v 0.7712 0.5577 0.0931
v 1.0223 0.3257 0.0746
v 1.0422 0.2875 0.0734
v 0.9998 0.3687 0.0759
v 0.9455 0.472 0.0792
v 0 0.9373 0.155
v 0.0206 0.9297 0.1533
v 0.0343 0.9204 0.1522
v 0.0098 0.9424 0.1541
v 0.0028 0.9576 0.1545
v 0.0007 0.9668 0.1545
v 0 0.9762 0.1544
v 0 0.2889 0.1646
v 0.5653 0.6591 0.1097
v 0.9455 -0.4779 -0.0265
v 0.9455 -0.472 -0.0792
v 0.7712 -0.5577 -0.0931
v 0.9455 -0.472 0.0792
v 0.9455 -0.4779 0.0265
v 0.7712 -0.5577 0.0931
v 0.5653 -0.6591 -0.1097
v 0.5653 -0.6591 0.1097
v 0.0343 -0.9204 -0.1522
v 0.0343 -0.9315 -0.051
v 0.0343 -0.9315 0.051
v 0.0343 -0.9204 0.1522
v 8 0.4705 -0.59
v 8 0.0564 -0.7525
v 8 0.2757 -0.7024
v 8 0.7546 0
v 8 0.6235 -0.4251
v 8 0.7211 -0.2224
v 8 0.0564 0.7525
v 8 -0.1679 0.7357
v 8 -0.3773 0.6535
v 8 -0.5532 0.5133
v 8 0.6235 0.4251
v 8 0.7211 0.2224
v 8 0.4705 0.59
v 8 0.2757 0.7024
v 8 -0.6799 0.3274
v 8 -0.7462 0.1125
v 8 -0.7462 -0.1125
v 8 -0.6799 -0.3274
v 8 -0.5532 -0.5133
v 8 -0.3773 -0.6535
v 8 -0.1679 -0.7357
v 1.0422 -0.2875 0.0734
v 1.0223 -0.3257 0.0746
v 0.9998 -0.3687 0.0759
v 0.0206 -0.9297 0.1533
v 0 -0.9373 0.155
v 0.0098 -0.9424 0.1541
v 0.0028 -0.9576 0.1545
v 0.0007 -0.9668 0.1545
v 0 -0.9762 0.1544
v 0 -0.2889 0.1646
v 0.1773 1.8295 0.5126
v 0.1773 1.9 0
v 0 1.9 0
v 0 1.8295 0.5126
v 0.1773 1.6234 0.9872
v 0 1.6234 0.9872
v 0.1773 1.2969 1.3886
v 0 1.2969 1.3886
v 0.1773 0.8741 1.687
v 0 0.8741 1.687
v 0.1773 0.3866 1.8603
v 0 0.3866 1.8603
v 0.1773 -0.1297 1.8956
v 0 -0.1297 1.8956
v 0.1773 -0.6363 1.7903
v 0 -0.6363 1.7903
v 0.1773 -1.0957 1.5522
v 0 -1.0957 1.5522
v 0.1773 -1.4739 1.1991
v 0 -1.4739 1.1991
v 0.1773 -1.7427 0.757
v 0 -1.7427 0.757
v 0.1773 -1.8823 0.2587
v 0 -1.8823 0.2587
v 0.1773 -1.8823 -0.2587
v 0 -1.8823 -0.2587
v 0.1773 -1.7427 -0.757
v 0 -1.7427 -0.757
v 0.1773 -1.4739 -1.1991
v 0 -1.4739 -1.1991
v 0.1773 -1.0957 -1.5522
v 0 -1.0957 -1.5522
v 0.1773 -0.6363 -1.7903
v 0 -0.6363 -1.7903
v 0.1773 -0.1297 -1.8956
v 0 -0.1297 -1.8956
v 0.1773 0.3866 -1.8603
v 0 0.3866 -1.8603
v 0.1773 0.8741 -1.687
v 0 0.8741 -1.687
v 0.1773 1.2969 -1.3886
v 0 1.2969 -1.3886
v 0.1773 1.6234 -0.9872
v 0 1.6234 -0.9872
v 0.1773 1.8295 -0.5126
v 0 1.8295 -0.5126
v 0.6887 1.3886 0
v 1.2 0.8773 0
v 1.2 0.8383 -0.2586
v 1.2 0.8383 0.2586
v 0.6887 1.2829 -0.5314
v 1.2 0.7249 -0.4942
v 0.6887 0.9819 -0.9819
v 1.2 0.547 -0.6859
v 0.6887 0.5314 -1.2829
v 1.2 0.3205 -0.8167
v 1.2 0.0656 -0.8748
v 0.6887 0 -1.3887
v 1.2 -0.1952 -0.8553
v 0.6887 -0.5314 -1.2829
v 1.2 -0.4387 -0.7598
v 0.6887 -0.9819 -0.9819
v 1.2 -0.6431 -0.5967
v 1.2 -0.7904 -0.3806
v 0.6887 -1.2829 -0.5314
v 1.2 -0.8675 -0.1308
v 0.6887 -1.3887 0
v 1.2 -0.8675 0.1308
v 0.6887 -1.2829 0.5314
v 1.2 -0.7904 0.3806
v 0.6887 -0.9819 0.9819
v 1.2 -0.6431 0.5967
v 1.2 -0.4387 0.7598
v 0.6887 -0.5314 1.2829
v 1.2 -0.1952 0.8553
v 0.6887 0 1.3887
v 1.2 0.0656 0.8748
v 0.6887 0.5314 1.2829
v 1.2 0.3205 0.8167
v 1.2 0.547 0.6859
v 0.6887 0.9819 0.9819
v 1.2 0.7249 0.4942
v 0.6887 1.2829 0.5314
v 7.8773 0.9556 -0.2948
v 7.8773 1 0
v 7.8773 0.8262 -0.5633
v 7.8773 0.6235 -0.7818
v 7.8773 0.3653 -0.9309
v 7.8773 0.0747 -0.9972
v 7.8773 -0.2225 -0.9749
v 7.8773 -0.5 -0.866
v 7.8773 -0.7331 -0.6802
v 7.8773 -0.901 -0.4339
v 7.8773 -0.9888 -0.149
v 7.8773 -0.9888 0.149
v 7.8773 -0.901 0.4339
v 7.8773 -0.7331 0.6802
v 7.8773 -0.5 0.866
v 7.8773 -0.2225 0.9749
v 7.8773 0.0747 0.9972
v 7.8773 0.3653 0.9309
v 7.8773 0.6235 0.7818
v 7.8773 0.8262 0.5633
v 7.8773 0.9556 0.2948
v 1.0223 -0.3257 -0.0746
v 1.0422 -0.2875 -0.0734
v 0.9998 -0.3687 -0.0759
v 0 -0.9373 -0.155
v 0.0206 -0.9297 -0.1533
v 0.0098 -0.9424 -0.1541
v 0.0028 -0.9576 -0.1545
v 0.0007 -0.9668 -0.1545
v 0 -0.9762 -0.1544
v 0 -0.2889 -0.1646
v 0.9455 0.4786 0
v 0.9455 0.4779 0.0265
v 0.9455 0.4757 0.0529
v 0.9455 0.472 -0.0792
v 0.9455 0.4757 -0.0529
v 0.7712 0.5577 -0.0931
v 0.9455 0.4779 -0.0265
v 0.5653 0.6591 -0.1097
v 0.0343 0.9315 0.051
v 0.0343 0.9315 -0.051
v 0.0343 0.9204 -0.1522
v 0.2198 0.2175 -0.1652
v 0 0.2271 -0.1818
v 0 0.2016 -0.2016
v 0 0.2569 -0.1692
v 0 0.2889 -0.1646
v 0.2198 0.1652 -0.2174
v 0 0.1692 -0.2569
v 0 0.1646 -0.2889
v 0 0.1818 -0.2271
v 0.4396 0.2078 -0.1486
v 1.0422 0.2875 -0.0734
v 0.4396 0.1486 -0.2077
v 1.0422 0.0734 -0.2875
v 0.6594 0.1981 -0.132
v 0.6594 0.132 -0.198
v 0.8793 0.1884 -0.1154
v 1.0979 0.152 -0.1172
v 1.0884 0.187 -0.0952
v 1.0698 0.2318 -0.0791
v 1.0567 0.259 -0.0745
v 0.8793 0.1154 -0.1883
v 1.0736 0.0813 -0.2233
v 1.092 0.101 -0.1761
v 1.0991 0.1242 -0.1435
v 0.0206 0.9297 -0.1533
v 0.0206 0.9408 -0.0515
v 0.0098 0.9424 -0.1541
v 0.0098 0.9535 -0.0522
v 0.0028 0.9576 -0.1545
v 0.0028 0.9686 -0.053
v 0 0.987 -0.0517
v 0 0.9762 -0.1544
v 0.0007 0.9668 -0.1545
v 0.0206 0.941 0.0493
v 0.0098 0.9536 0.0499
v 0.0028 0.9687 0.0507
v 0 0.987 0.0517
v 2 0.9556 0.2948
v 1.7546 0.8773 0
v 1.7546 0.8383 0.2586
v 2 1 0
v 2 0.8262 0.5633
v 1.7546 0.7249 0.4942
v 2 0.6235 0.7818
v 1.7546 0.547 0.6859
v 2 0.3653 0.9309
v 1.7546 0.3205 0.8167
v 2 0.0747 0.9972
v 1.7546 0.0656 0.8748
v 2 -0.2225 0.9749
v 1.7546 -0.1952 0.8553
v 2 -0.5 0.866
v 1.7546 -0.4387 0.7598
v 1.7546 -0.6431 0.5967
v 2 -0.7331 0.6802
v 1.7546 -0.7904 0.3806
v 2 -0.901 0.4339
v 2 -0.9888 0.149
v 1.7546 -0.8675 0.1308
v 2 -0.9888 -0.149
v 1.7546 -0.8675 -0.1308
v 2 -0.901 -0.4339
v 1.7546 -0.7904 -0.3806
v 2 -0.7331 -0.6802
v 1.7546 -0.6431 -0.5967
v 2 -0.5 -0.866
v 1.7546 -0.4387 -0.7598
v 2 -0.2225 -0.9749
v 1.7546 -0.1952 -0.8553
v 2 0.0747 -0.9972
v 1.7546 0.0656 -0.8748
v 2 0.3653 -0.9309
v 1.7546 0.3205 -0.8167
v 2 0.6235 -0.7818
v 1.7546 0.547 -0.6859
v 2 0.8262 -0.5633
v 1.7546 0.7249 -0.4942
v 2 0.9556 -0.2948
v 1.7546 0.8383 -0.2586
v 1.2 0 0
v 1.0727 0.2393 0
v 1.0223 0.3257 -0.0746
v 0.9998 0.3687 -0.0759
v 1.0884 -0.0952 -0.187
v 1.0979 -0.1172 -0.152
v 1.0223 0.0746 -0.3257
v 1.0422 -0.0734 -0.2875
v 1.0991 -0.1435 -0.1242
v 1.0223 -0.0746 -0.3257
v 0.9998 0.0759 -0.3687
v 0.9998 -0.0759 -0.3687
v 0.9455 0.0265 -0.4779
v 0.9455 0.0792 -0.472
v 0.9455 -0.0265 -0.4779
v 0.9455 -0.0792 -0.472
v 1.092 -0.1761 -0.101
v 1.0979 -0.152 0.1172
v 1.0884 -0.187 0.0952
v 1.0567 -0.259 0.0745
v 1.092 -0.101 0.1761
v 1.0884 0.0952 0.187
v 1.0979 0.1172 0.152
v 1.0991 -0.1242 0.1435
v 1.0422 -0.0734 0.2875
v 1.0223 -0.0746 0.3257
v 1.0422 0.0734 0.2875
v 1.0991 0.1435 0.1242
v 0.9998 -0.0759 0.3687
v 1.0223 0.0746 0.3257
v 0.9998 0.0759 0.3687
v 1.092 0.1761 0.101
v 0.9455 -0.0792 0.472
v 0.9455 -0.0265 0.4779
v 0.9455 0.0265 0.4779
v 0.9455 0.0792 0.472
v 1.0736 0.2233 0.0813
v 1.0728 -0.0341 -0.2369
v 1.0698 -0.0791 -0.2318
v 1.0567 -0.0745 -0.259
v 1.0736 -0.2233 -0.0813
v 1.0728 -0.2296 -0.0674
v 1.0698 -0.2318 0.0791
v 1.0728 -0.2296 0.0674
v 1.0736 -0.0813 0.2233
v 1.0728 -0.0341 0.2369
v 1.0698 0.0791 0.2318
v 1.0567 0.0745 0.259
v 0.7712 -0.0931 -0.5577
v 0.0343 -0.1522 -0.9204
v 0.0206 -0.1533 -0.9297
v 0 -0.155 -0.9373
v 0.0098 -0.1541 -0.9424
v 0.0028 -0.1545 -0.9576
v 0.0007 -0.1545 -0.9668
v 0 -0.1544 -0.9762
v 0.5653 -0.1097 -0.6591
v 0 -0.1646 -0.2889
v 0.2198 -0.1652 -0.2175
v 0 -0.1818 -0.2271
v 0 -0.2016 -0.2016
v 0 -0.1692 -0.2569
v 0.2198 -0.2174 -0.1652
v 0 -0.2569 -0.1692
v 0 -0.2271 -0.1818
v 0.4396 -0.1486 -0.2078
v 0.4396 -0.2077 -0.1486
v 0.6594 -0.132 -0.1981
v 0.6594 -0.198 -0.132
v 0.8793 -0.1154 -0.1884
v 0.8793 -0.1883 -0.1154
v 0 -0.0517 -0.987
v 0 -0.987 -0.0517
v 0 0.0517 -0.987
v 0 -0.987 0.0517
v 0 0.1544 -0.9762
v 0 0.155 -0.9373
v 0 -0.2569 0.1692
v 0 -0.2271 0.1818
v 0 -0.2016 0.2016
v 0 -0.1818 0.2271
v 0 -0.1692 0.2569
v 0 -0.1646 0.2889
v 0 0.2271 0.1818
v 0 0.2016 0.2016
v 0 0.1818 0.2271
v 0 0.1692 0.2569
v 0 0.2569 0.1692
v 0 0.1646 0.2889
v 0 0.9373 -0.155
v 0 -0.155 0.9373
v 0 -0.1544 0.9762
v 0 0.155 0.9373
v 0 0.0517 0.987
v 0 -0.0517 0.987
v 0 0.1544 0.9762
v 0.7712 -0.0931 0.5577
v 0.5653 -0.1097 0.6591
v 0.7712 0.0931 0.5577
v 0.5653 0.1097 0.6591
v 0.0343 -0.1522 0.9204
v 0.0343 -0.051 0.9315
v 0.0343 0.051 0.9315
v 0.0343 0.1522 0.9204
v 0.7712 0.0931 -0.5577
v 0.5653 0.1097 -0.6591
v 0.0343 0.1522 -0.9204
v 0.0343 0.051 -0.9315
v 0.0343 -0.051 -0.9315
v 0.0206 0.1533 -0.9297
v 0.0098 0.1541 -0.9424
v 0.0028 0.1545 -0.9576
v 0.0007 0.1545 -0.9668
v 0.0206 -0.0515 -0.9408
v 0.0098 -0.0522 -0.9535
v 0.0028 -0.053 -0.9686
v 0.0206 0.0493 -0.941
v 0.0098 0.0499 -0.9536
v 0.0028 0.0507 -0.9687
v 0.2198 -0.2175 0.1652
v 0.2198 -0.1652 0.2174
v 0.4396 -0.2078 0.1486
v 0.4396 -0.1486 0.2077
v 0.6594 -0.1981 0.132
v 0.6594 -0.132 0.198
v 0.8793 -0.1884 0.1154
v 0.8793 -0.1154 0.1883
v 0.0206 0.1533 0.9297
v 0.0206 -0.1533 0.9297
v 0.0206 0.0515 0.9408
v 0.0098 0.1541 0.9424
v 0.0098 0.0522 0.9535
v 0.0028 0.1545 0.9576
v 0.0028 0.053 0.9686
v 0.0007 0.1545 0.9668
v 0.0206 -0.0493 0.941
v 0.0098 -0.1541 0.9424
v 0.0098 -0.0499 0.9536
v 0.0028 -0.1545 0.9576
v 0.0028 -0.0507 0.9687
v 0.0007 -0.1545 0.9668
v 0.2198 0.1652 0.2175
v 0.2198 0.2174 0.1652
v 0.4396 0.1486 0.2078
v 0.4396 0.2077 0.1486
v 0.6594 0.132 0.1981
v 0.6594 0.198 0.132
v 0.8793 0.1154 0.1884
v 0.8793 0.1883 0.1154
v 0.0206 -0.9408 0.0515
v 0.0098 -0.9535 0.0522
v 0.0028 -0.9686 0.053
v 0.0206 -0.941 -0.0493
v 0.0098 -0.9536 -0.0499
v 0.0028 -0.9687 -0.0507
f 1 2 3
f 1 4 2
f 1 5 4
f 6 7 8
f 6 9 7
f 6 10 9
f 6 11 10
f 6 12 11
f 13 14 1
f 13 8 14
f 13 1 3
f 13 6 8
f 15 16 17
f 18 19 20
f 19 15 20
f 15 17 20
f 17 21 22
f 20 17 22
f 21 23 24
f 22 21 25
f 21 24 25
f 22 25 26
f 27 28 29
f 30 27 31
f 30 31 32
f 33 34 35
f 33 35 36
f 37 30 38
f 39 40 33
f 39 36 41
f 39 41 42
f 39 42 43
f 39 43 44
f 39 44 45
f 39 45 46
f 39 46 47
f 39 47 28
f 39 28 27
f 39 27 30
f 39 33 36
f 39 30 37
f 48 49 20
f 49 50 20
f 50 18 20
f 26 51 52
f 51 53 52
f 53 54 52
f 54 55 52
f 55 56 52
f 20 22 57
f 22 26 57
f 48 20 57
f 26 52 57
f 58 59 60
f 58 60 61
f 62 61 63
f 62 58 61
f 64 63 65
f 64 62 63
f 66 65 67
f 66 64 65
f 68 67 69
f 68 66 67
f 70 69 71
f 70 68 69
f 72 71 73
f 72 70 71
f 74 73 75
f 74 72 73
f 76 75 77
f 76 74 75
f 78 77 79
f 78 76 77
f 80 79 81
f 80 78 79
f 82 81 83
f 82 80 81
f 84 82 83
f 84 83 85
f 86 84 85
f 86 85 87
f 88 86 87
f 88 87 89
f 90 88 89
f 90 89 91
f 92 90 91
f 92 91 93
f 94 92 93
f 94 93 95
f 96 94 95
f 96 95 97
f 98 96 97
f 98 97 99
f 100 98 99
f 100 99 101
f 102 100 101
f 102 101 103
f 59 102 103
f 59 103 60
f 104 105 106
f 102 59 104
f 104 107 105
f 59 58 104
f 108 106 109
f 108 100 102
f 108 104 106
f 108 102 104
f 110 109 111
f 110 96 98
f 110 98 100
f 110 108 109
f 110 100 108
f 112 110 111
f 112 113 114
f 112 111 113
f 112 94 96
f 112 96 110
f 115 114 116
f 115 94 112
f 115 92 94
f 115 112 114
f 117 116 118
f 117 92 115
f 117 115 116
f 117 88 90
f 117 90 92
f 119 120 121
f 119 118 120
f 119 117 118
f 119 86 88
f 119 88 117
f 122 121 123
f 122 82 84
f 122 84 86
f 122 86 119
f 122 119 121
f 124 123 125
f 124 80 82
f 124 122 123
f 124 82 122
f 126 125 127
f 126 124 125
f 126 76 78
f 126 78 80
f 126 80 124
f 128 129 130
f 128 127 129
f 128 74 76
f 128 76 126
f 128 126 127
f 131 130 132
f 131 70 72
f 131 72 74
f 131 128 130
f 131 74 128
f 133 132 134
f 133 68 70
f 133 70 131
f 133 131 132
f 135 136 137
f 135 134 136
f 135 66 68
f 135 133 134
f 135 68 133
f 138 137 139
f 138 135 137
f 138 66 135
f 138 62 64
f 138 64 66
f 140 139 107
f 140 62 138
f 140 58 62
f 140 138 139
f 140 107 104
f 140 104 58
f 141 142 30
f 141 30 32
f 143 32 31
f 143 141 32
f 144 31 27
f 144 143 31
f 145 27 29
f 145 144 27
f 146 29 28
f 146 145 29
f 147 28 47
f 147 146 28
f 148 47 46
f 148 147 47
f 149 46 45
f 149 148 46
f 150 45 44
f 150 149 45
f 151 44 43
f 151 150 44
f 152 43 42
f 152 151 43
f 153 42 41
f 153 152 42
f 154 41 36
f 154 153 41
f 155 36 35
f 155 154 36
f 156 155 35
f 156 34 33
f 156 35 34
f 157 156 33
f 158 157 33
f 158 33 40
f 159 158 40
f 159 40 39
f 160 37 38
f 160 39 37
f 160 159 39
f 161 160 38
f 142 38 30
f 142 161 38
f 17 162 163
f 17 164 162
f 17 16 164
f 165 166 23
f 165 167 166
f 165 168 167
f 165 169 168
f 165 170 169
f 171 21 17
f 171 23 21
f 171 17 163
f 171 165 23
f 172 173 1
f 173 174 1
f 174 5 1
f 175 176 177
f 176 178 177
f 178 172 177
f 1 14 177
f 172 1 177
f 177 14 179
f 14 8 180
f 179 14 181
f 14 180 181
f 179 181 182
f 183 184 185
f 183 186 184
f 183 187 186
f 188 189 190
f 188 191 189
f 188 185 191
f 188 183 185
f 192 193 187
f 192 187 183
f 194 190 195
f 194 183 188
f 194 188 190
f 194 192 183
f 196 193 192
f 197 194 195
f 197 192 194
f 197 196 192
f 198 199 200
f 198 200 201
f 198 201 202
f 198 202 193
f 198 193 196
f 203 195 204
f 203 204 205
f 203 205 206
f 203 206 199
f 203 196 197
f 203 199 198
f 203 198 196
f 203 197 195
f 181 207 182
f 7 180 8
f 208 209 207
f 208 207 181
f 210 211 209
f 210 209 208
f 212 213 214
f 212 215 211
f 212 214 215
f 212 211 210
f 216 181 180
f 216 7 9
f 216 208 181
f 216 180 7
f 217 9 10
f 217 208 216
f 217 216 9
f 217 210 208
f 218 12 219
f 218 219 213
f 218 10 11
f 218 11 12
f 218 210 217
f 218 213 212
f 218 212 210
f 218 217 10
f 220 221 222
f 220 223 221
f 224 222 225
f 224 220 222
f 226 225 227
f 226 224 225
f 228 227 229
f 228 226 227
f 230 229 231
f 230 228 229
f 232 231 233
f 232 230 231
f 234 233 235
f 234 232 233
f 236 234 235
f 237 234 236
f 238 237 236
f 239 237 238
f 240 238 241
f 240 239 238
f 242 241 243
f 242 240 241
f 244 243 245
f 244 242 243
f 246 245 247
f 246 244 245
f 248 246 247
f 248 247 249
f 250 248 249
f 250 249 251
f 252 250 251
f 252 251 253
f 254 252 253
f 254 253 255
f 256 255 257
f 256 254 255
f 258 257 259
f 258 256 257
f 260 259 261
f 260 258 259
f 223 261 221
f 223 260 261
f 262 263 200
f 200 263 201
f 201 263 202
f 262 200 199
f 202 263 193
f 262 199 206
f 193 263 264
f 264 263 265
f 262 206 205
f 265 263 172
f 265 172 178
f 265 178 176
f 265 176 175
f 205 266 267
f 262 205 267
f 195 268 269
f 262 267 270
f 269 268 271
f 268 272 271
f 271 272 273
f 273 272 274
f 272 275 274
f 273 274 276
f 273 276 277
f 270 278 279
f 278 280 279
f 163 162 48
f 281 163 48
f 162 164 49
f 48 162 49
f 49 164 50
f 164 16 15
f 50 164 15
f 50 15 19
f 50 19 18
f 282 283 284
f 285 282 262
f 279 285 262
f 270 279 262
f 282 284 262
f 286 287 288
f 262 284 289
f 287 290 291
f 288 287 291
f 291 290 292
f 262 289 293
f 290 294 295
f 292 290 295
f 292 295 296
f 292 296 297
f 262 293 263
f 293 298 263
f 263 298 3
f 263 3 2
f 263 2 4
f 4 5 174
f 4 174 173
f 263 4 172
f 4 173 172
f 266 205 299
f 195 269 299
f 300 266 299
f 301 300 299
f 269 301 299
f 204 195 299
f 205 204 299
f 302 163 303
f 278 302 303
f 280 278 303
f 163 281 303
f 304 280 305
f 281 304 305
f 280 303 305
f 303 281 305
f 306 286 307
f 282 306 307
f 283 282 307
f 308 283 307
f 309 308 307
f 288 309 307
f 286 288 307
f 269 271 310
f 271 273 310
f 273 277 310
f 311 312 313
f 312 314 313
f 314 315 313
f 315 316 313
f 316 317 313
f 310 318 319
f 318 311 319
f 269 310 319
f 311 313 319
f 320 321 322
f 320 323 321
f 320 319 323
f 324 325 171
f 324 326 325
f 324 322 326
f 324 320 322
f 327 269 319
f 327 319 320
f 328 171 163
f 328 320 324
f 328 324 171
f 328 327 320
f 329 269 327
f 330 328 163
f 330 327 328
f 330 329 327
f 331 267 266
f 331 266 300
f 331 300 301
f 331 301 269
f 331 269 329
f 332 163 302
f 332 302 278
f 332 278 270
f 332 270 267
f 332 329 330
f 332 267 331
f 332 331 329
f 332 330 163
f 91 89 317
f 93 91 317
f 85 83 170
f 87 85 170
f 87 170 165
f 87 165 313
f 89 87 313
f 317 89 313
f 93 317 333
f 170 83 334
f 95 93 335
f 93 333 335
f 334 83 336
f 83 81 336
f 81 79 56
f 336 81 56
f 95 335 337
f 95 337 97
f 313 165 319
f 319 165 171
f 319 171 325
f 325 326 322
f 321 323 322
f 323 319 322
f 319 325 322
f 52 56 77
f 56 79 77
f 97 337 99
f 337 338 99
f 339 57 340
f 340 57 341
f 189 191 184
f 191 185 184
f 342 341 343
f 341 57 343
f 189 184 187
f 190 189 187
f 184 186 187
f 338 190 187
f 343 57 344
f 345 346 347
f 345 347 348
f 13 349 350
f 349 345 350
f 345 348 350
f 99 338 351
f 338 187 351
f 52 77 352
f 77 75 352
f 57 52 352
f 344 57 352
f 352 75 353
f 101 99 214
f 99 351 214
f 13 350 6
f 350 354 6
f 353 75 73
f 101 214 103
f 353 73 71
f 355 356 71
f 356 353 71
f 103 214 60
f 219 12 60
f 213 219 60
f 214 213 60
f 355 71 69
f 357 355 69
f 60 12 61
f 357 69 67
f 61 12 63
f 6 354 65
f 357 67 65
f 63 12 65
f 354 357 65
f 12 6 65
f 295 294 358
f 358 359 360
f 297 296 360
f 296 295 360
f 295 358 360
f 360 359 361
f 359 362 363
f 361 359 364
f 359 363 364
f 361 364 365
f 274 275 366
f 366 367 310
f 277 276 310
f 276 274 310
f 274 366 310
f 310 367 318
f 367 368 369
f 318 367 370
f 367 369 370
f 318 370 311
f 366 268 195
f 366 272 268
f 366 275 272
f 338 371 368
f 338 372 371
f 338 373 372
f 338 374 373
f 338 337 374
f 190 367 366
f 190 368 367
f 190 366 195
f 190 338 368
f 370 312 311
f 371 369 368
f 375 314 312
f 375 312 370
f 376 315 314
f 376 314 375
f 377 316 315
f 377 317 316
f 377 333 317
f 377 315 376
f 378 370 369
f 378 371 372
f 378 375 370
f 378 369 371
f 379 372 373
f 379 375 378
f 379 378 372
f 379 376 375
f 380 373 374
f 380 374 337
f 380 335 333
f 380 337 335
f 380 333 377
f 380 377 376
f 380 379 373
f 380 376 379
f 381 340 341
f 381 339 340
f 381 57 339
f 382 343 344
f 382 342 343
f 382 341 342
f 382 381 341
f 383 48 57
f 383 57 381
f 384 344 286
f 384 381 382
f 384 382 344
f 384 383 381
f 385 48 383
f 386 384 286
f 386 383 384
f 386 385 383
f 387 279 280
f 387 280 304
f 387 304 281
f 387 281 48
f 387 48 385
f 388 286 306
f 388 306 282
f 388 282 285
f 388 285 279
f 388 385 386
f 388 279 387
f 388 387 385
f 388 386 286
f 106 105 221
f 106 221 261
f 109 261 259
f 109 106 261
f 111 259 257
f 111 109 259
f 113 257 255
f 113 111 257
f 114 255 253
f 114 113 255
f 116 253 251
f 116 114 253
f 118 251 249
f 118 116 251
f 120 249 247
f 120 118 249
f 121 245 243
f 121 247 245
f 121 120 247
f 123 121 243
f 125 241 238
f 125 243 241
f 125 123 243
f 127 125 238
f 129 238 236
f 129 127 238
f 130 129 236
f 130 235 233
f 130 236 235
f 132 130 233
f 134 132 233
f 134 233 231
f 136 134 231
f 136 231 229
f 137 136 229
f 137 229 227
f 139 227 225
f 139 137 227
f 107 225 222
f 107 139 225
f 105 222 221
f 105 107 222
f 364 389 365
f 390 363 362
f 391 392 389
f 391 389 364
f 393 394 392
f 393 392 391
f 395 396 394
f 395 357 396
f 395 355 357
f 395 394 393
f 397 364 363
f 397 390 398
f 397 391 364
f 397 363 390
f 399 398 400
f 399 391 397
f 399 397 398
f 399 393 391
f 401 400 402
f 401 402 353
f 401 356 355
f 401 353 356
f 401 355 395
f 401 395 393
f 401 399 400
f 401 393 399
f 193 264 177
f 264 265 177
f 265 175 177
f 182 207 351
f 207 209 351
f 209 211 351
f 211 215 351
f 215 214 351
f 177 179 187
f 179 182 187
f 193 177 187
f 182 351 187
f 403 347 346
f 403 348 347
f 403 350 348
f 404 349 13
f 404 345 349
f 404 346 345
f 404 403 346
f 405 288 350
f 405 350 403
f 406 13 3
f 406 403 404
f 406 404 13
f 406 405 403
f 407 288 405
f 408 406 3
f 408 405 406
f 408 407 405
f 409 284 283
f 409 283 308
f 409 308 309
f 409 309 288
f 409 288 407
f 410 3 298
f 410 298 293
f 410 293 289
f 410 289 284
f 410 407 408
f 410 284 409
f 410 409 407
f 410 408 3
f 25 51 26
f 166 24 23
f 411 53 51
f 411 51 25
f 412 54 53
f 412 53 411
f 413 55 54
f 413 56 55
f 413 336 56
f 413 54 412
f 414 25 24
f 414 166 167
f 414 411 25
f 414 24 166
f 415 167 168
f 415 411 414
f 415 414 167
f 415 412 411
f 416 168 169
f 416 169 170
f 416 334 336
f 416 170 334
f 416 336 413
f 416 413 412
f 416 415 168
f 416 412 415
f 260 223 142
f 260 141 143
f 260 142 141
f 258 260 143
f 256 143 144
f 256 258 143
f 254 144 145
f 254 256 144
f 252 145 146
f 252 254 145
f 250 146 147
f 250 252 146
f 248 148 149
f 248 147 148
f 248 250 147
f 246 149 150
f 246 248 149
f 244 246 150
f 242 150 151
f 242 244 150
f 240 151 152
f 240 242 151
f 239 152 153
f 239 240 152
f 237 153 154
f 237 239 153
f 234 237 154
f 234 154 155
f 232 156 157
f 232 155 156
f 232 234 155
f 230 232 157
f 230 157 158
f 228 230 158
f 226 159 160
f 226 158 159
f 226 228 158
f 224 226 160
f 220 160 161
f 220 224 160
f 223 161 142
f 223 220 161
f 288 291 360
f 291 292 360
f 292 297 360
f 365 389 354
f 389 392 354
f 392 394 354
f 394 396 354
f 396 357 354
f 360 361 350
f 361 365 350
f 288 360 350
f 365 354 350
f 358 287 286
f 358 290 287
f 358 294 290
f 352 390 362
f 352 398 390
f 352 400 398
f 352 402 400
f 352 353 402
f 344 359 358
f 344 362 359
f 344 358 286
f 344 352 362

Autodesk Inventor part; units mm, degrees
ref_plane "YZ Plane" through (0, 0, 0) normal (1, 0, 0) x (0, 1, 0)
ref_plane "XZ Plane" through (0, 0, 0) normal (0, 1, 0) x (-1, 0, 0)
sketch "Sketch1" plane through (0, 0, 0) normal (0, 0, 1) x (1, 0, 0)
  line L0 (1.2, 0) -> (8, 0)
  line L1 (8, 0) -> (8, 1)
  line L2 (8, 1) -> (2, 1)
  line L3 (2, 1) -> (1.7546, 0.8773)
  line L4 (1.7546, 0.8773) -> (1.2, 0.8773)
  line L5 (0, 1.9) -> (0, 0.95)
  line L6 (0, 0.95) -> (0.9455, 0.4786)
  line L7 (0.9455, 0.4786) -> (1.2, 0)
  line L8 (-1.6, 0) -> (9.6, 0) projected
  line L9 (0, -0.38) -> (0, 2.28) projected
  line L10 (0, 1.9) -> (0.1773, 1.9)
  line L11 (0.1773, 1.9) -> (1.2, 0.8773)
  line L12 (2, 1) -> (1.0773, 1) construction
  dimension "d1" = 6
  dimension "d2" = 2
  dimension "d3" = 1.7546
  dimension "d4" = 1.9
  dimension "d5" = 26.5
  dimension "d6" = 62
  dimension "d7" = 1.2
  dimension "d8" = 0.2454
  dimension "d12" = 3.8
  dimension "d13" = 45
  dimension "d15" = 8
  dimension "d24" = 1.2
revolve "Body" add sketch "Sketch1" angle 360 about axis through (1.2, 0, 0) along (1, 0, 0) contours L7 L6 L5 L10 L11 L4 L3 L2 L1 L0
sketch "Sketch2" plane through (0, 0, 0) normal (-1, 0, 0) x (0, 0, 1)
  line L0 (0, 0.95) -> (0, 0) construction
  line L1 (0, 0) -> (0.95, 0) construction
  arc A0 (0.285, 0) -> (0, 0.285) centre (0, 0) ccw construction
  arc A1 (0.3325, 0) -> (0, 0.3325) centre (0, 0) ccw construction
  arc A2 (0.9373, 0.155) -> (0.155, 0.9373) centre (0, 0) ccw
  line L2 (0, 0) -> (0.6718, 0.6718) construction
  line L3 (0.155, 0.9373) -> (0.1646, 0.2889)
  line L4 (0.9373, 0.155) -> (0.2889, 0.1646)
  arc A3 (0.155, 0.9373) -> (0, 0.95) centre (0, 0) ccw
  arc A4 (0.95, 0) -> (0.9373, 0.155) centre (0, 0) ccw
  line L5 (0, -2.66) -> (0, 2.66) projected
  line L6 (-2.66, 0) -> (2.66, 0) projected
  arc A5 (0.155, -0.9373) -> (0.9373, -0.155) centre (0, 0) ccw
  line L7 (0.155, -0.9373) -> (0.1646, -0.2889)
  line L8 (0.9373, -0.155) -> (0.2889, -0.1646)
  arc A6 (0, -0.95) -> (0.155, -0.9373) centre (0, 0) ccw
  arc A7 (0.9373, -0.155) -> (0.95, 0) centre (0, 0) ccw
  arc A8 (-0.155, 0.9373) -> (-0.9373, 0.155) centre (0, 0) ccw
  line L9 (-0.155, 0.9373) -> (-0.1646, 0.2889)
  line L10 (-0.9373, 0.155) -> (-0.2889, 0.1646)
  arc A9 (0, 0.95) -> (-0.155, 0.9373) centre (0, 0) ccw
  arc A10 (-0.9373, 0.155) -> (-0.95, 0) centre (0, 0) ccw
  arc A11 (-0.155, -0.9373) -> (0, -0.95) centre (0, 0) ccw
  arc A12 (-0.9373, -0.155) -> (-0.155, -0.9373) centre (0, 0) ccw
  arc A13 (-0.95, 0) -> (-0.9373, -0.155) centre (0, 0) ccw
  line L11 (-0.9373, -0.155) -> (-0.2889, -0.1646)
  line L12 (-0.155, -0.9373) -> (-0.1646, -0.2889)
  arc A14 (0.1646, 0.2889) -> (0.2889, 0.1646) centre (0.2908, 0.2908) ccw
  arc A15 (0.2889, -0.1646) -> (0.1646, -0.2889) centre (0.2908, -0.2908) ccw
  arc A16 (-0.2889, 0.1646) -> (-0.1646, 0.2889) centre (-0.2908, 0.2908) ccw
  arc A17 (-0.1646, -0.2889) -> (-0.2889, -0.1646) centre (-0.2908, -0.2908) ccw
  point P0 (0.6718, -0.6718)
  point P1 (-0.6718, 0.6718)
  point P2 (-0.6718, -0.6718)
  dimension "d17" = 0.57
  dimension "d18" = 0.665
  dimension "d19" = 1.9
  dimension "d20" = 45
  dimension "d21" = 0.155
extrude "Slot" add sketch "Sketch2" against normal up to next draft 5 contours L4 A14 L3 A2 | A5 L7 A15 L8 | L9 A16 L10 A8 | A12 L11 A17 L12
fillet "Fillet1" radius 0.062 4 edges at (0, 0.95, 0) (0, 0, -0.95) (0, -0.95, 0) (0, 0, 0.95)
thread "Thread" size "M2x0.4" class "6g" standard "ISO Metric profile" length 6
chamfer "Chamfer1" distance 0.2454 distance2 0.1227 1 edges at (8, -1, 0) measured on face at (8, -0.1182, -0.3117)
ref_plane "Work Plane2" through (3.35, 0, 0) normal (0, 0, -1) x (1, 0, 0)
equation "\"d1\" = GEL"
equation "\"d2\" = GD"
equation "\"d3\" = BDM"
equation "\"d4\" = SDM"
equation "\"d7\" = INTI"
equation "\"d8\" = GAL"
equation "\"d12\" = KOD"
equation "\"d13\" = 0.5 * SEWI"
equation "\"d15\" = NLG"
equation "\"d24\" = KOH"
equation "\"d17\" = 0.3 * SDM"
equation "\"d18\" = 0.35 * SDM"
equation "\"d19\" = SDM"
equation "\"d21\" = 0.5 * SBR"
equation "\"d23\" = 0.2 * SBR"
equation "\"d10\" = GEL"
equation "\"d25\" = -0.5 * SPD + 0.5 * GD"
equation "\"d26\" = 0.5 * GAL"
equation "\"NLG\" = 8"
equation "\"GEL\" = 6"
equation "\"GAL\" = 0.61345 * PTC"
equation "\"SPD\" = NND - 1.2269 * PTC"
equation "\"KOD\" = 3.8"
equation "\"KOH\" = 1.2"
equation "\"SBR\" = 0.31"
equation "\"INTI\" = 1.2"
equation "\"SDM\" = 1.9"
equation "\"GD\" = NND"
equation "\"BDM\" = NND - GAL"
equation "\"SEWI\" = 90deg"
equation "\"d9\" = SDM"
equation "\"GUL\" = 0.61345 * PTC"
equation "\"TOA\" = 30deg"
equation "\"EPV\" = 2.2"
equation "\"THREADDIA\" = 2"
equation "\"PTC\" = 0.4"
equation "\"NND\" = 2"
equation "\"GD1\" = THREADDIA - 1.2269 * PTC"
properties part number "ISO 7046-1 - M2 x 8 - 4.8 - H" material "Steel"
